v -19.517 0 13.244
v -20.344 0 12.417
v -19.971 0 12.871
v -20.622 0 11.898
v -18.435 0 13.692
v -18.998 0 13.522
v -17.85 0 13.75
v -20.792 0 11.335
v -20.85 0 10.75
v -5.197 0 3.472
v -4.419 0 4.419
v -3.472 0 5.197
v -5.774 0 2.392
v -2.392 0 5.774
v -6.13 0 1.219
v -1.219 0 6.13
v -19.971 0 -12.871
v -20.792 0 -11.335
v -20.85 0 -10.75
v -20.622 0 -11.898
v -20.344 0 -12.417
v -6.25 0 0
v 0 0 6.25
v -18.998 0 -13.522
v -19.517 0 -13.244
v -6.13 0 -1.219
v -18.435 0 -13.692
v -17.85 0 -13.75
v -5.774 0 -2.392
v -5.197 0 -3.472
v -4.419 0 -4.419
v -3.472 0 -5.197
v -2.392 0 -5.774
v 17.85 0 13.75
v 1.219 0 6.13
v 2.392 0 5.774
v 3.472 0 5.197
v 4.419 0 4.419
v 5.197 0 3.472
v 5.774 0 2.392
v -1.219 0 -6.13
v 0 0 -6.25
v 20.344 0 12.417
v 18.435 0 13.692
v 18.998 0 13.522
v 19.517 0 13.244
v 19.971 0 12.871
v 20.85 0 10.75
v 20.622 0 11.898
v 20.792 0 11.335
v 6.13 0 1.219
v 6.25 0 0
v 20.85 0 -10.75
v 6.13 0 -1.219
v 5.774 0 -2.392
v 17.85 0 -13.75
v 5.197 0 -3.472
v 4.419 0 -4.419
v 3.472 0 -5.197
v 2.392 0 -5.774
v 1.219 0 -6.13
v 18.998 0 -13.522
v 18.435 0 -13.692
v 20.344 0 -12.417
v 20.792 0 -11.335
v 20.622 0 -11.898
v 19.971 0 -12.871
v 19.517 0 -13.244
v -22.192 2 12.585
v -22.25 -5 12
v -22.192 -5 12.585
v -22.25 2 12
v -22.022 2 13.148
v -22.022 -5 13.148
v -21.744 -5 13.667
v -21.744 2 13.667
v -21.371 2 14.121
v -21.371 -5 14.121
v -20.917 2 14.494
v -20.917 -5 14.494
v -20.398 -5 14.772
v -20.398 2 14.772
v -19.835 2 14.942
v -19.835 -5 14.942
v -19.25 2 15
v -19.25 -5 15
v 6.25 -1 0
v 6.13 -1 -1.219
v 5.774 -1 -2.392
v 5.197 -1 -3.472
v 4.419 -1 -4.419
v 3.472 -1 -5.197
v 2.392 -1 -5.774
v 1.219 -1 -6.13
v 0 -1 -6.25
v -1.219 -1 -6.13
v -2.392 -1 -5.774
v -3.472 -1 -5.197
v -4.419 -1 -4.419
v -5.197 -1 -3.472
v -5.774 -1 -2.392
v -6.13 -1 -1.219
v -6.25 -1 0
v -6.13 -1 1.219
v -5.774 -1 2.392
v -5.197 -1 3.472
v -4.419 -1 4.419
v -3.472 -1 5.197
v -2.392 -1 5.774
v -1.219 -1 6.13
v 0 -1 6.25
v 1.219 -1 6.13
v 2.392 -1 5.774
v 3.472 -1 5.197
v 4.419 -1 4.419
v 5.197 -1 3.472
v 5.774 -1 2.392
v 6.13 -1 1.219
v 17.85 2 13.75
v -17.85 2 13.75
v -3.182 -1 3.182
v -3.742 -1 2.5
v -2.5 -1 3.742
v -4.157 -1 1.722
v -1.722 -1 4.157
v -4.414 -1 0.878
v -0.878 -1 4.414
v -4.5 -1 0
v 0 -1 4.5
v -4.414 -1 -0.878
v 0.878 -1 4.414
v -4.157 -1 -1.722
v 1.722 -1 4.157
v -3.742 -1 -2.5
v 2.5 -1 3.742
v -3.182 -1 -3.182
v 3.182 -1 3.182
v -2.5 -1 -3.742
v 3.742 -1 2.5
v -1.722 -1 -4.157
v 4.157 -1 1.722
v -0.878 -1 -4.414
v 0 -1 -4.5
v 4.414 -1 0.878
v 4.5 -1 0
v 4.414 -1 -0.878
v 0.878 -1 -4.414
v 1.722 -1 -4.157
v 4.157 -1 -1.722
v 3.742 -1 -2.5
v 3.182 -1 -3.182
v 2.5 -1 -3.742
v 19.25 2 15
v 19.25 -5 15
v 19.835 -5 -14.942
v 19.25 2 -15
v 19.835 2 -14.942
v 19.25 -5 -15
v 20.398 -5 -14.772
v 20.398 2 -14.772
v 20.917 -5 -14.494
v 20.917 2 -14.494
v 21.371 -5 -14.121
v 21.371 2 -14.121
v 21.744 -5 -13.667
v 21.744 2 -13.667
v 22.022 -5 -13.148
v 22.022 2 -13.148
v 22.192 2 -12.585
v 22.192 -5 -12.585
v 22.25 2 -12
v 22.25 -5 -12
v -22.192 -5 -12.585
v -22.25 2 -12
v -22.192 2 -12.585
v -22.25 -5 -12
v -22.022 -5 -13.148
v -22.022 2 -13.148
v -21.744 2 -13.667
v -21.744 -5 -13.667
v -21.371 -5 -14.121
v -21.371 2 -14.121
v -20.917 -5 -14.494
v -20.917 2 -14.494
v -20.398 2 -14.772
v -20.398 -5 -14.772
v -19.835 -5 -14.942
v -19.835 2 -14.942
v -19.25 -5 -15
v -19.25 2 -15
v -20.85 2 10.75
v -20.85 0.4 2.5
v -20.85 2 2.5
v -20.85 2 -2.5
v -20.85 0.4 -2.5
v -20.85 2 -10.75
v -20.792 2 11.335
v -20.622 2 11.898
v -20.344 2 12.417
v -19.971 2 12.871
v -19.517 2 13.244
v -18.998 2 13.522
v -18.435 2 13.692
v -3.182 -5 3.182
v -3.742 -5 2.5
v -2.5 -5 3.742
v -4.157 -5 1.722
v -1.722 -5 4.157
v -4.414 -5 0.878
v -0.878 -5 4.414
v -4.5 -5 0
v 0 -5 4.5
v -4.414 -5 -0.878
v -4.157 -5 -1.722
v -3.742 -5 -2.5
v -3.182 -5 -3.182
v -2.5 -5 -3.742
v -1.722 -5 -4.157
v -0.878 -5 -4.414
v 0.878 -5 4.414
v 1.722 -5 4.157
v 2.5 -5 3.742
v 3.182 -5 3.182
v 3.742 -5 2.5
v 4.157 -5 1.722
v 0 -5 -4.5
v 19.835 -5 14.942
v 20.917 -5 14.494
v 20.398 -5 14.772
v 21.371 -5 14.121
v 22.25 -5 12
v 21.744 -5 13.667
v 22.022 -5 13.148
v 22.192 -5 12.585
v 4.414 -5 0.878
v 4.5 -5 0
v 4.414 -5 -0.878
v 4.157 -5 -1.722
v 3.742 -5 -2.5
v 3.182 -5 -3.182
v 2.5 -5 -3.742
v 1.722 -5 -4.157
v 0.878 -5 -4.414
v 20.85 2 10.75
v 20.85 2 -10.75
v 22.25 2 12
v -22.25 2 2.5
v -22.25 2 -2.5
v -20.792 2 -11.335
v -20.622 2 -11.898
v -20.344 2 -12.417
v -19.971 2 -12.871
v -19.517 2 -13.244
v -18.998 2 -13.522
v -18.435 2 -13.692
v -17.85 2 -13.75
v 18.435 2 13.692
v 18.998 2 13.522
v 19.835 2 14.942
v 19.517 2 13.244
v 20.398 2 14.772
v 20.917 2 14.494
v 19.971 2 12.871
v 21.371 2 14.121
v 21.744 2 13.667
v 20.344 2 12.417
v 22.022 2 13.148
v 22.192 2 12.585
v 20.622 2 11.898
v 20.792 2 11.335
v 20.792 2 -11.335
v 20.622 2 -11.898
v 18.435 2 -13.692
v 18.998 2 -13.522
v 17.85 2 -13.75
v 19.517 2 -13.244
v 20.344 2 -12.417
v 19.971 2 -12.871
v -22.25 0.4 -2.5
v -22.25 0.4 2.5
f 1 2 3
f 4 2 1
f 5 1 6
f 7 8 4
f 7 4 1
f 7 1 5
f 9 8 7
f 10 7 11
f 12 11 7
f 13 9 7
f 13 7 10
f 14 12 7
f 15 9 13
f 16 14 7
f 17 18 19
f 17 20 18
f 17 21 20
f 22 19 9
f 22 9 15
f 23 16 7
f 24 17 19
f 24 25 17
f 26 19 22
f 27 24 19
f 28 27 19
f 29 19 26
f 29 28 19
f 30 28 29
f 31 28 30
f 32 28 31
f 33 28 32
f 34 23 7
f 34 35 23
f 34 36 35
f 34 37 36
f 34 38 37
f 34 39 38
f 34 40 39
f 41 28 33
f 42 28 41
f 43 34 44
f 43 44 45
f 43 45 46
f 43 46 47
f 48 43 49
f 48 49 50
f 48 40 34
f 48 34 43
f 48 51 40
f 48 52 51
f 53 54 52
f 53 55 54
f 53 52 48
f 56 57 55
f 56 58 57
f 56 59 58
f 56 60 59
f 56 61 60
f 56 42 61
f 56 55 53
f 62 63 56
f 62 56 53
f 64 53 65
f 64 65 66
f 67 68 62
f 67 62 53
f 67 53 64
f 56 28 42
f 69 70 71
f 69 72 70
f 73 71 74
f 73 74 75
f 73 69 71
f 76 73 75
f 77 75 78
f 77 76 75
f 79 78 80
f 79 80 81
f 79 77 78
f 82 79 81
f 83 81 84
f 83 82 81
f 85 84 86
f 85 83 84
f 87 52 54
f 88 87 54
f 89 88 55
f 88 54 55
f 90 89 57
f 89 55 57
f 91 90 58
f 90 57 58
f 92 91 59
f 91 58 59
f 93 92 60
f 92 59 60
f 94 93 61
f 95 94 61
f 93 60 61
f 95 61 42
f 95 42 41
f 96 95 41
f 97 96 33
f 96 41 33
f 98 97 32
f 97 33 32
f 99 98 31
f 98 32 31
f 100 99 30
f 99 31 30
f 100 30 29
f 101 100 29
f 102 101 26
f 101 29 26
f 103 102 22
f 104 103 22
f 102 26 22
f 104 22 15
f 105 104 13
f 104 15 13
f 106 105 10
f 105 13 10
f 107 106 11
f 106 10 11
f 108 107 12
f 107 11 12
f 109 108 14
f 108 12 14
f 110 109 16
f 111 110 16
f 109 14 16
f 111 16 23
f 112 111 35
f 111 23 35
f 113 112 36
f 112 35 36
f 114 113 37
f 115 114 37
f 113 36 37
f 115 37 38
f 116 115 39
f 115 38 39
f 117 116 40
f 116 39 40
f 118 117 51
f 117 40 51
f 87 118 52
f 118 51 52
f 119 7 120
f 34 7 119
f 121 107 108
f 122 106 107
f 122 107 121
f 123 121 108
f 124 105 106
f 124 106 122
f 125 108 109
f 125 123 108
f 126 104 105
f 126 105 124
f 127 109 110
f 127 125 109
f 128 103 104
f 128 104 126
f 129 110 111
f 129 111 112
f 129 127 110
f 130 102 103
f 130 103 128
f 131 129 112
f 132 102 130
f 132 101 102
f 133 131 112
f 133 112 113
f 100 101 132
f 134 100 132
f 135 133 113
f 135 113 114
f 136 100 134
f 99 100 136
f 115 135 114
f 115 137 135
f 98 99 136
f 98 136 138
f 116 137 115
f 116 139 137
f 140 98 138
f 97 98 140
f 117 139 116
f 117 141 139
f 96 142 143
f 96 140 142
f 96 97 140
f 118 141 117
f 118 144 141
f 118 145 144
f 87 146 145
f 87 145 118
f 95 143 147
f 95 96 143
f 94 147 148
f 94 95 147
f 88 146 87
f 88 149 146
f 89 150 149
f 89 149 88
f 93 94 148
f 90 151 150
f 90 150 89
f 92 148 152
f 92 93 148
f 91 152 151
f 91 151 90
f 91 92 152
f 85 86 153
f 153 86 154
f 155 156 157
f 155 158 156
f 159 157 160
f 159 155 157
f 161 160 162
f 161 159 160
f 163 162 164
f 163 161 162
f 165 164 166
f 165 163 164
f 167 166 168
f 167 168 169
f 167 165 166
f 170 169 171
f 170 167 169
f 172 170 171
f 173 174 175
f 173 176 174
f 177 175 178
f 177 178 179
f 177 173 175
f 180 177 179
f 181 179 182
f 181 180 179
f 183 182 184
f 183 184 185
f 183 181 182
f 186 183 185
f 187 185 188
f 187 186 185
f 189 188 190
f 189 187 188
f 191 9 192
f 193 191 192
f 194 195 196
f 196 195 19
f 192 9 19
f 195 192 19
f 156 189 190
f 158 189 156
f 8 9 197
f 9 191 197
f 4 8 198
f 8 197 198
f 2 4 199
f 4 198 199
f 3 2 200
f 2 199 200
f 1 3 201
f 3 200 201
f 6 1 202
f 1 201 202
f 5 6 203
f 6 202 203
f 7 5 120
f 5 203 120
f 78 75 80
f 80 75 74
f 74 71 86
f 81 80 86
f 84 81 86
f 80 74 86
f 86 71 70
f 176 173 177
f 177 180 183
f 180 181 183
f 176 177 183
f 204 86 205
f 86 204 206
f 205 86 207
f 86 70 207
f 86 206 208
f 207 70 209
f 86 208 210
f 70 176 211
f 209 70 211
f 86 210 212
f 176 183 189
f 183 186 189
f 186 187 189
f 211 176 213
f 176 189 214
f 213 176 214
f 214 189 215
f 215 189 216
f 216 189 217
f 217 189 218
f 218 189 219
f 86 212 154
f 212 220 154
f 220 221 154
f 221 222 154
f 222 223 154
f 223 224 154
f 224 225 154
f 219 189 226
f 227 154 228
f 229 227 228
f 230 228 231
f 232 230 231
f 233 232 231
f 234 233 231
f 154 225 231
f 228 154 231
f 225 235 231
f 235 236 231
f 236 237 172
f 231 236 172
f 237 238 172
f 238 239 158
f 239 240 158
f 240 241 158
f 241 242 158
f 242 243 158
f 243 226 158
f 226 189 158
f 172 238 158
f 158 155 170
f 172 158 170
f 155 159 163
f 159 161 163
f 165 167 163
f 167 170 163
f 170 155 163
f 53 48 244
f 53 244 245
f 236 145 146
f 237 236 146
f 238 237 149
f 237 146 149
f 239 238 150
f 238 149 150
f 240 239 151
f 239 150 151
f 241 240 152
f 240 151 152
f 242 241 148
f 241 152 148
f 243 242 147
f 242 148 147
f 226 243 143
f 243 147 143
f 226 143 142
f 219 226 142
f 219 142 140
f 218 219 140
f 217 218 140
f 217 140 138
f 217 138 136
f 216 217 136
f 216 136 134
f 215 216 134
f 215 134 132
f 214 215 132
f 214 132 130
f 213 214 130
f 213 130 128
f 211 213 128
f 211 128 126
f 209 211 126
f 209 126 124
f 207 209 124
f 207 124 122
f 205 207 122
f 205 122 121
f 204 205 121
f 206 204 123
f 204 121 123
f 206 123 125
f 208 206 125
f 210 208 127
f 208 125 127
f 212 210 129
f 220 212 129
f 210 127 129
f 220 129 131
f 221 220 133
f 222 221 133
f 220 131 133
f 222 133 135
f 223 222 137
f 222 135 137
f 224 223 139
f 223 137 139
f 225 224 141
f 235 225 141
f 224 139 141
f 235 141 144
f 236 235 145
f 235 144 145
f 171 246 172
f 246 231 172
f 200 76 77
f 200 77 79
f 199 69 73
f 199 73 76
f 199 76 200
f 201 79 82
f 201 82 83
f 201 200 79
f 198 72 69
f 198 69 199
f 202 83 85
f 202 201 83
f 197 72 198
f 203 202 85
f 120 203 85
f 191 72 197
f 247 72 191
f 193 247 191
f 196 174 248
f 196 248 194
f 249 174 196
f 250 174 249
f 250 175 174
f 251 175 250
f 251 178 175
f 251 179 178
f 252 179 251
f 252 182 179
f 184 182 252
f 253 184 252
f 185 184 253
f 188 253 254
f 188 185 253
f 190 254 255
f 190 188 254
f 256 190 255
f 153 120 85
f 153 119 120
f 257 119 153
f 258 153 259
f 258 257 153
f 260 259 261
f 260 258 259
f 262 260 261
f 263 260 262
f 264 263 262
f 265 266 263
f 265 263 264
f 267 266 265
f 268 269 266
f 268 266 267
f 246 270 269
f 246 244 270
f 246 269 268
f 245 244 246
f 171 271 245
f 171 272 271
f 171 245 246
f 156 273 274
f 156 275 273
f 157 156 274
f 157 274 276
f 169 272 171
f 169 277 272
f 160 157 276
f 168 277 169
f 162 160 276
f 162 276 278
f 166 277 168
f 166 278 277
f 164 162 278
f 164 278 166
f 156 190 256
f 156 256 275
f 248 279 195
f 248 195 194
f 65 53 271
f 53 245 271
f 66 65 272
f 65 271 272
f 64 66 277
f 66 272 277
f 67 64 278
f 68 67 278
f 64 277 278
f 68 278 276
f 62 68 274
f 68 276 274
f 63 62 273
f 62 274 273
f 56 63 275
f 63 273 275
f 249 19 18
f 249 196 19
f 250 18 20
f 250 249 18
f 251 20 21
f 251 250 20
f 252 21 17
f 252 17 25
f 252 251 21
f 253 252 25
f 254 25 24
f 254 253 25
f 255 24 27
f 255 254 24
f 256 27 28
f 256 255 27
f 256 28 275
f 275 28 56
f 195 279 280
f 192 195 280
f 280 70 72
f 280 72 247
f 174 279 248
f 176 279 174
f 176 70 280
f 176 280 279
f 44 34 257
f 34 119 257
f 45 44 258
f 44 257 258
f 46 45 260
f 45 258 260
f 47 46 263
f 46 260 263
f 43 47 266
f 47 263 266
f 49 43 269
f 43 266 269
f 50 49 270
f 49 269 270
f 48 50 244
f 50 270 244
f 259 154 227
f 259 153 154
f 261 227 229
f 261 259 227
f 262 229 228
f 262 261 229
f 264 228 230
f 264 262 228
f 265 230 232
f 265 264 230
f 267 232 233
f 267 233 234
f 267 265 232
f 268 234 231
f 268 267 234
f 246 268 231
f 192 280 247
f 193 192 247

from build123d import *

# Parameters (mm, degrees)
SKETCH1_W           = 44.5
SKETCH1_H           = 30
BOSS_EXTRUDE1_DEPTH = 5
CUT_EXTRUDE1_REACH  = 7
SKETCH2_R           = 4.5
SKETCH5_W           = 44.5
SKETCH5_H           = 30
SKETCH5_W_2         = 41.7
SKETCH5_H_2         = 27.5
BOSS_EXTRUDE2_DEPTH = 2
CUT_EXTRUDE5_REACH  = 46.5
SKETCH6_W           = 5
SKETCH6_H           = 1.6
FILLET1_R           = 3
SKETCH7_R           = 6.25
CUT_EXTRUDE6_DEPTH  = 1


with BuildPart() as part:
    # Sketch1 → Boss-Extrude1 (new body)
    with BuildSketch(Plane(origin=(0, 0, 0), x_dir=(1, 0, 0), z_dir=(0, 1, 0))):
        Rectangle(SKETCH1_W, SKETCH1_H)
    extrude(amount=-BOSS_EXTRUDE1_DEPTH)

    # Sketch2 → Cut-Extrude1 (cut, up to next)
    with BuildSketch(Plane(origin=(0, 0, 0), x_dir=(1, 0, 0), z_dir=(0, 1, 0)), mode=Mode.PRIVATE) as cut_extrude1_sk1:
        Circle(SKETCH2_R)
    cut_extrude1_tool1 = extrude(cut_extrude1_sk1.sketch, amount=-CUT_EXTRUDE1_REACH, mode=Mode.PRIVATE) & part.part
    add(cut_extrude1_tool1.solids().sort_by_distance((0, 0, 0))[0], mode=Mode.SUBTRACT)

    # Sketch5 → Boss-Extrude2 (add)
    with BuildSketch(Plane(origin=(0, 0, 0), x_dir=(1, 0, 0), z_dir=(0, 1, 0))):
        Rectangle(SKETCH5_W, SKETCH5_H)
        Rectangle(SKETCH5_W_2, SKETCH5_H_2, mode=Mode.SUBTRACT)
    extrude(amount=BOSS_EXTRUDE2_DEPTH)

    # Sketch6 → Cut-Extrude5 (cut, up to next)
    with BuildSketch(Plane.ZY.offset(22.25), mode=Mode.PRIVATE) as cut_extrude5_sk1:
        with Locations((0, 1.2)):
            Rectangle(SKETCH6_W, SKETCH6_H)
    cut_extrude5_tool1 = extrude(cut_extrude5_sk1.sketch, amount=-CUT_EXTRUDE5_REACH, mode=Mode.PRIVATE) & part.part
    add(cut_extrude5_tool1.solids().sort_by_distance((-22.25, 1.2, 0))[0], mode=Mode.SUBTRACT)

    # Fillet1
    fillet1_edges = [part.edges().sort_by_distance(p)[0] for p in [
        (-20.85, 1, 13.75),
        (20.85, 1, 13.75),
        (20.85, 1, -13.75),
        (-20.85, 1, -13.75),
        (22.25, -1.5, 15),
        (-22.25, -1.5, 15),
        (-22.25, -1.5, -15),
        (22.25, -1.5, -15),
    ]]
    fillet(fillet1_edges, radius=FILLET1_R)

    # Sketch7 → Cut-Extrude6 (cut)
    with BuildSketch(Plane(origin=(0, 0, 0), x_dir=(1, 0, 0), z_dir=(0, 1, 0))):
        Circle(SKETCH7_R)
    extrude(amount=-CUT_EXTRUDE6_DEPTH, mode=Mode.SUBTRACT)


solid = part.part
